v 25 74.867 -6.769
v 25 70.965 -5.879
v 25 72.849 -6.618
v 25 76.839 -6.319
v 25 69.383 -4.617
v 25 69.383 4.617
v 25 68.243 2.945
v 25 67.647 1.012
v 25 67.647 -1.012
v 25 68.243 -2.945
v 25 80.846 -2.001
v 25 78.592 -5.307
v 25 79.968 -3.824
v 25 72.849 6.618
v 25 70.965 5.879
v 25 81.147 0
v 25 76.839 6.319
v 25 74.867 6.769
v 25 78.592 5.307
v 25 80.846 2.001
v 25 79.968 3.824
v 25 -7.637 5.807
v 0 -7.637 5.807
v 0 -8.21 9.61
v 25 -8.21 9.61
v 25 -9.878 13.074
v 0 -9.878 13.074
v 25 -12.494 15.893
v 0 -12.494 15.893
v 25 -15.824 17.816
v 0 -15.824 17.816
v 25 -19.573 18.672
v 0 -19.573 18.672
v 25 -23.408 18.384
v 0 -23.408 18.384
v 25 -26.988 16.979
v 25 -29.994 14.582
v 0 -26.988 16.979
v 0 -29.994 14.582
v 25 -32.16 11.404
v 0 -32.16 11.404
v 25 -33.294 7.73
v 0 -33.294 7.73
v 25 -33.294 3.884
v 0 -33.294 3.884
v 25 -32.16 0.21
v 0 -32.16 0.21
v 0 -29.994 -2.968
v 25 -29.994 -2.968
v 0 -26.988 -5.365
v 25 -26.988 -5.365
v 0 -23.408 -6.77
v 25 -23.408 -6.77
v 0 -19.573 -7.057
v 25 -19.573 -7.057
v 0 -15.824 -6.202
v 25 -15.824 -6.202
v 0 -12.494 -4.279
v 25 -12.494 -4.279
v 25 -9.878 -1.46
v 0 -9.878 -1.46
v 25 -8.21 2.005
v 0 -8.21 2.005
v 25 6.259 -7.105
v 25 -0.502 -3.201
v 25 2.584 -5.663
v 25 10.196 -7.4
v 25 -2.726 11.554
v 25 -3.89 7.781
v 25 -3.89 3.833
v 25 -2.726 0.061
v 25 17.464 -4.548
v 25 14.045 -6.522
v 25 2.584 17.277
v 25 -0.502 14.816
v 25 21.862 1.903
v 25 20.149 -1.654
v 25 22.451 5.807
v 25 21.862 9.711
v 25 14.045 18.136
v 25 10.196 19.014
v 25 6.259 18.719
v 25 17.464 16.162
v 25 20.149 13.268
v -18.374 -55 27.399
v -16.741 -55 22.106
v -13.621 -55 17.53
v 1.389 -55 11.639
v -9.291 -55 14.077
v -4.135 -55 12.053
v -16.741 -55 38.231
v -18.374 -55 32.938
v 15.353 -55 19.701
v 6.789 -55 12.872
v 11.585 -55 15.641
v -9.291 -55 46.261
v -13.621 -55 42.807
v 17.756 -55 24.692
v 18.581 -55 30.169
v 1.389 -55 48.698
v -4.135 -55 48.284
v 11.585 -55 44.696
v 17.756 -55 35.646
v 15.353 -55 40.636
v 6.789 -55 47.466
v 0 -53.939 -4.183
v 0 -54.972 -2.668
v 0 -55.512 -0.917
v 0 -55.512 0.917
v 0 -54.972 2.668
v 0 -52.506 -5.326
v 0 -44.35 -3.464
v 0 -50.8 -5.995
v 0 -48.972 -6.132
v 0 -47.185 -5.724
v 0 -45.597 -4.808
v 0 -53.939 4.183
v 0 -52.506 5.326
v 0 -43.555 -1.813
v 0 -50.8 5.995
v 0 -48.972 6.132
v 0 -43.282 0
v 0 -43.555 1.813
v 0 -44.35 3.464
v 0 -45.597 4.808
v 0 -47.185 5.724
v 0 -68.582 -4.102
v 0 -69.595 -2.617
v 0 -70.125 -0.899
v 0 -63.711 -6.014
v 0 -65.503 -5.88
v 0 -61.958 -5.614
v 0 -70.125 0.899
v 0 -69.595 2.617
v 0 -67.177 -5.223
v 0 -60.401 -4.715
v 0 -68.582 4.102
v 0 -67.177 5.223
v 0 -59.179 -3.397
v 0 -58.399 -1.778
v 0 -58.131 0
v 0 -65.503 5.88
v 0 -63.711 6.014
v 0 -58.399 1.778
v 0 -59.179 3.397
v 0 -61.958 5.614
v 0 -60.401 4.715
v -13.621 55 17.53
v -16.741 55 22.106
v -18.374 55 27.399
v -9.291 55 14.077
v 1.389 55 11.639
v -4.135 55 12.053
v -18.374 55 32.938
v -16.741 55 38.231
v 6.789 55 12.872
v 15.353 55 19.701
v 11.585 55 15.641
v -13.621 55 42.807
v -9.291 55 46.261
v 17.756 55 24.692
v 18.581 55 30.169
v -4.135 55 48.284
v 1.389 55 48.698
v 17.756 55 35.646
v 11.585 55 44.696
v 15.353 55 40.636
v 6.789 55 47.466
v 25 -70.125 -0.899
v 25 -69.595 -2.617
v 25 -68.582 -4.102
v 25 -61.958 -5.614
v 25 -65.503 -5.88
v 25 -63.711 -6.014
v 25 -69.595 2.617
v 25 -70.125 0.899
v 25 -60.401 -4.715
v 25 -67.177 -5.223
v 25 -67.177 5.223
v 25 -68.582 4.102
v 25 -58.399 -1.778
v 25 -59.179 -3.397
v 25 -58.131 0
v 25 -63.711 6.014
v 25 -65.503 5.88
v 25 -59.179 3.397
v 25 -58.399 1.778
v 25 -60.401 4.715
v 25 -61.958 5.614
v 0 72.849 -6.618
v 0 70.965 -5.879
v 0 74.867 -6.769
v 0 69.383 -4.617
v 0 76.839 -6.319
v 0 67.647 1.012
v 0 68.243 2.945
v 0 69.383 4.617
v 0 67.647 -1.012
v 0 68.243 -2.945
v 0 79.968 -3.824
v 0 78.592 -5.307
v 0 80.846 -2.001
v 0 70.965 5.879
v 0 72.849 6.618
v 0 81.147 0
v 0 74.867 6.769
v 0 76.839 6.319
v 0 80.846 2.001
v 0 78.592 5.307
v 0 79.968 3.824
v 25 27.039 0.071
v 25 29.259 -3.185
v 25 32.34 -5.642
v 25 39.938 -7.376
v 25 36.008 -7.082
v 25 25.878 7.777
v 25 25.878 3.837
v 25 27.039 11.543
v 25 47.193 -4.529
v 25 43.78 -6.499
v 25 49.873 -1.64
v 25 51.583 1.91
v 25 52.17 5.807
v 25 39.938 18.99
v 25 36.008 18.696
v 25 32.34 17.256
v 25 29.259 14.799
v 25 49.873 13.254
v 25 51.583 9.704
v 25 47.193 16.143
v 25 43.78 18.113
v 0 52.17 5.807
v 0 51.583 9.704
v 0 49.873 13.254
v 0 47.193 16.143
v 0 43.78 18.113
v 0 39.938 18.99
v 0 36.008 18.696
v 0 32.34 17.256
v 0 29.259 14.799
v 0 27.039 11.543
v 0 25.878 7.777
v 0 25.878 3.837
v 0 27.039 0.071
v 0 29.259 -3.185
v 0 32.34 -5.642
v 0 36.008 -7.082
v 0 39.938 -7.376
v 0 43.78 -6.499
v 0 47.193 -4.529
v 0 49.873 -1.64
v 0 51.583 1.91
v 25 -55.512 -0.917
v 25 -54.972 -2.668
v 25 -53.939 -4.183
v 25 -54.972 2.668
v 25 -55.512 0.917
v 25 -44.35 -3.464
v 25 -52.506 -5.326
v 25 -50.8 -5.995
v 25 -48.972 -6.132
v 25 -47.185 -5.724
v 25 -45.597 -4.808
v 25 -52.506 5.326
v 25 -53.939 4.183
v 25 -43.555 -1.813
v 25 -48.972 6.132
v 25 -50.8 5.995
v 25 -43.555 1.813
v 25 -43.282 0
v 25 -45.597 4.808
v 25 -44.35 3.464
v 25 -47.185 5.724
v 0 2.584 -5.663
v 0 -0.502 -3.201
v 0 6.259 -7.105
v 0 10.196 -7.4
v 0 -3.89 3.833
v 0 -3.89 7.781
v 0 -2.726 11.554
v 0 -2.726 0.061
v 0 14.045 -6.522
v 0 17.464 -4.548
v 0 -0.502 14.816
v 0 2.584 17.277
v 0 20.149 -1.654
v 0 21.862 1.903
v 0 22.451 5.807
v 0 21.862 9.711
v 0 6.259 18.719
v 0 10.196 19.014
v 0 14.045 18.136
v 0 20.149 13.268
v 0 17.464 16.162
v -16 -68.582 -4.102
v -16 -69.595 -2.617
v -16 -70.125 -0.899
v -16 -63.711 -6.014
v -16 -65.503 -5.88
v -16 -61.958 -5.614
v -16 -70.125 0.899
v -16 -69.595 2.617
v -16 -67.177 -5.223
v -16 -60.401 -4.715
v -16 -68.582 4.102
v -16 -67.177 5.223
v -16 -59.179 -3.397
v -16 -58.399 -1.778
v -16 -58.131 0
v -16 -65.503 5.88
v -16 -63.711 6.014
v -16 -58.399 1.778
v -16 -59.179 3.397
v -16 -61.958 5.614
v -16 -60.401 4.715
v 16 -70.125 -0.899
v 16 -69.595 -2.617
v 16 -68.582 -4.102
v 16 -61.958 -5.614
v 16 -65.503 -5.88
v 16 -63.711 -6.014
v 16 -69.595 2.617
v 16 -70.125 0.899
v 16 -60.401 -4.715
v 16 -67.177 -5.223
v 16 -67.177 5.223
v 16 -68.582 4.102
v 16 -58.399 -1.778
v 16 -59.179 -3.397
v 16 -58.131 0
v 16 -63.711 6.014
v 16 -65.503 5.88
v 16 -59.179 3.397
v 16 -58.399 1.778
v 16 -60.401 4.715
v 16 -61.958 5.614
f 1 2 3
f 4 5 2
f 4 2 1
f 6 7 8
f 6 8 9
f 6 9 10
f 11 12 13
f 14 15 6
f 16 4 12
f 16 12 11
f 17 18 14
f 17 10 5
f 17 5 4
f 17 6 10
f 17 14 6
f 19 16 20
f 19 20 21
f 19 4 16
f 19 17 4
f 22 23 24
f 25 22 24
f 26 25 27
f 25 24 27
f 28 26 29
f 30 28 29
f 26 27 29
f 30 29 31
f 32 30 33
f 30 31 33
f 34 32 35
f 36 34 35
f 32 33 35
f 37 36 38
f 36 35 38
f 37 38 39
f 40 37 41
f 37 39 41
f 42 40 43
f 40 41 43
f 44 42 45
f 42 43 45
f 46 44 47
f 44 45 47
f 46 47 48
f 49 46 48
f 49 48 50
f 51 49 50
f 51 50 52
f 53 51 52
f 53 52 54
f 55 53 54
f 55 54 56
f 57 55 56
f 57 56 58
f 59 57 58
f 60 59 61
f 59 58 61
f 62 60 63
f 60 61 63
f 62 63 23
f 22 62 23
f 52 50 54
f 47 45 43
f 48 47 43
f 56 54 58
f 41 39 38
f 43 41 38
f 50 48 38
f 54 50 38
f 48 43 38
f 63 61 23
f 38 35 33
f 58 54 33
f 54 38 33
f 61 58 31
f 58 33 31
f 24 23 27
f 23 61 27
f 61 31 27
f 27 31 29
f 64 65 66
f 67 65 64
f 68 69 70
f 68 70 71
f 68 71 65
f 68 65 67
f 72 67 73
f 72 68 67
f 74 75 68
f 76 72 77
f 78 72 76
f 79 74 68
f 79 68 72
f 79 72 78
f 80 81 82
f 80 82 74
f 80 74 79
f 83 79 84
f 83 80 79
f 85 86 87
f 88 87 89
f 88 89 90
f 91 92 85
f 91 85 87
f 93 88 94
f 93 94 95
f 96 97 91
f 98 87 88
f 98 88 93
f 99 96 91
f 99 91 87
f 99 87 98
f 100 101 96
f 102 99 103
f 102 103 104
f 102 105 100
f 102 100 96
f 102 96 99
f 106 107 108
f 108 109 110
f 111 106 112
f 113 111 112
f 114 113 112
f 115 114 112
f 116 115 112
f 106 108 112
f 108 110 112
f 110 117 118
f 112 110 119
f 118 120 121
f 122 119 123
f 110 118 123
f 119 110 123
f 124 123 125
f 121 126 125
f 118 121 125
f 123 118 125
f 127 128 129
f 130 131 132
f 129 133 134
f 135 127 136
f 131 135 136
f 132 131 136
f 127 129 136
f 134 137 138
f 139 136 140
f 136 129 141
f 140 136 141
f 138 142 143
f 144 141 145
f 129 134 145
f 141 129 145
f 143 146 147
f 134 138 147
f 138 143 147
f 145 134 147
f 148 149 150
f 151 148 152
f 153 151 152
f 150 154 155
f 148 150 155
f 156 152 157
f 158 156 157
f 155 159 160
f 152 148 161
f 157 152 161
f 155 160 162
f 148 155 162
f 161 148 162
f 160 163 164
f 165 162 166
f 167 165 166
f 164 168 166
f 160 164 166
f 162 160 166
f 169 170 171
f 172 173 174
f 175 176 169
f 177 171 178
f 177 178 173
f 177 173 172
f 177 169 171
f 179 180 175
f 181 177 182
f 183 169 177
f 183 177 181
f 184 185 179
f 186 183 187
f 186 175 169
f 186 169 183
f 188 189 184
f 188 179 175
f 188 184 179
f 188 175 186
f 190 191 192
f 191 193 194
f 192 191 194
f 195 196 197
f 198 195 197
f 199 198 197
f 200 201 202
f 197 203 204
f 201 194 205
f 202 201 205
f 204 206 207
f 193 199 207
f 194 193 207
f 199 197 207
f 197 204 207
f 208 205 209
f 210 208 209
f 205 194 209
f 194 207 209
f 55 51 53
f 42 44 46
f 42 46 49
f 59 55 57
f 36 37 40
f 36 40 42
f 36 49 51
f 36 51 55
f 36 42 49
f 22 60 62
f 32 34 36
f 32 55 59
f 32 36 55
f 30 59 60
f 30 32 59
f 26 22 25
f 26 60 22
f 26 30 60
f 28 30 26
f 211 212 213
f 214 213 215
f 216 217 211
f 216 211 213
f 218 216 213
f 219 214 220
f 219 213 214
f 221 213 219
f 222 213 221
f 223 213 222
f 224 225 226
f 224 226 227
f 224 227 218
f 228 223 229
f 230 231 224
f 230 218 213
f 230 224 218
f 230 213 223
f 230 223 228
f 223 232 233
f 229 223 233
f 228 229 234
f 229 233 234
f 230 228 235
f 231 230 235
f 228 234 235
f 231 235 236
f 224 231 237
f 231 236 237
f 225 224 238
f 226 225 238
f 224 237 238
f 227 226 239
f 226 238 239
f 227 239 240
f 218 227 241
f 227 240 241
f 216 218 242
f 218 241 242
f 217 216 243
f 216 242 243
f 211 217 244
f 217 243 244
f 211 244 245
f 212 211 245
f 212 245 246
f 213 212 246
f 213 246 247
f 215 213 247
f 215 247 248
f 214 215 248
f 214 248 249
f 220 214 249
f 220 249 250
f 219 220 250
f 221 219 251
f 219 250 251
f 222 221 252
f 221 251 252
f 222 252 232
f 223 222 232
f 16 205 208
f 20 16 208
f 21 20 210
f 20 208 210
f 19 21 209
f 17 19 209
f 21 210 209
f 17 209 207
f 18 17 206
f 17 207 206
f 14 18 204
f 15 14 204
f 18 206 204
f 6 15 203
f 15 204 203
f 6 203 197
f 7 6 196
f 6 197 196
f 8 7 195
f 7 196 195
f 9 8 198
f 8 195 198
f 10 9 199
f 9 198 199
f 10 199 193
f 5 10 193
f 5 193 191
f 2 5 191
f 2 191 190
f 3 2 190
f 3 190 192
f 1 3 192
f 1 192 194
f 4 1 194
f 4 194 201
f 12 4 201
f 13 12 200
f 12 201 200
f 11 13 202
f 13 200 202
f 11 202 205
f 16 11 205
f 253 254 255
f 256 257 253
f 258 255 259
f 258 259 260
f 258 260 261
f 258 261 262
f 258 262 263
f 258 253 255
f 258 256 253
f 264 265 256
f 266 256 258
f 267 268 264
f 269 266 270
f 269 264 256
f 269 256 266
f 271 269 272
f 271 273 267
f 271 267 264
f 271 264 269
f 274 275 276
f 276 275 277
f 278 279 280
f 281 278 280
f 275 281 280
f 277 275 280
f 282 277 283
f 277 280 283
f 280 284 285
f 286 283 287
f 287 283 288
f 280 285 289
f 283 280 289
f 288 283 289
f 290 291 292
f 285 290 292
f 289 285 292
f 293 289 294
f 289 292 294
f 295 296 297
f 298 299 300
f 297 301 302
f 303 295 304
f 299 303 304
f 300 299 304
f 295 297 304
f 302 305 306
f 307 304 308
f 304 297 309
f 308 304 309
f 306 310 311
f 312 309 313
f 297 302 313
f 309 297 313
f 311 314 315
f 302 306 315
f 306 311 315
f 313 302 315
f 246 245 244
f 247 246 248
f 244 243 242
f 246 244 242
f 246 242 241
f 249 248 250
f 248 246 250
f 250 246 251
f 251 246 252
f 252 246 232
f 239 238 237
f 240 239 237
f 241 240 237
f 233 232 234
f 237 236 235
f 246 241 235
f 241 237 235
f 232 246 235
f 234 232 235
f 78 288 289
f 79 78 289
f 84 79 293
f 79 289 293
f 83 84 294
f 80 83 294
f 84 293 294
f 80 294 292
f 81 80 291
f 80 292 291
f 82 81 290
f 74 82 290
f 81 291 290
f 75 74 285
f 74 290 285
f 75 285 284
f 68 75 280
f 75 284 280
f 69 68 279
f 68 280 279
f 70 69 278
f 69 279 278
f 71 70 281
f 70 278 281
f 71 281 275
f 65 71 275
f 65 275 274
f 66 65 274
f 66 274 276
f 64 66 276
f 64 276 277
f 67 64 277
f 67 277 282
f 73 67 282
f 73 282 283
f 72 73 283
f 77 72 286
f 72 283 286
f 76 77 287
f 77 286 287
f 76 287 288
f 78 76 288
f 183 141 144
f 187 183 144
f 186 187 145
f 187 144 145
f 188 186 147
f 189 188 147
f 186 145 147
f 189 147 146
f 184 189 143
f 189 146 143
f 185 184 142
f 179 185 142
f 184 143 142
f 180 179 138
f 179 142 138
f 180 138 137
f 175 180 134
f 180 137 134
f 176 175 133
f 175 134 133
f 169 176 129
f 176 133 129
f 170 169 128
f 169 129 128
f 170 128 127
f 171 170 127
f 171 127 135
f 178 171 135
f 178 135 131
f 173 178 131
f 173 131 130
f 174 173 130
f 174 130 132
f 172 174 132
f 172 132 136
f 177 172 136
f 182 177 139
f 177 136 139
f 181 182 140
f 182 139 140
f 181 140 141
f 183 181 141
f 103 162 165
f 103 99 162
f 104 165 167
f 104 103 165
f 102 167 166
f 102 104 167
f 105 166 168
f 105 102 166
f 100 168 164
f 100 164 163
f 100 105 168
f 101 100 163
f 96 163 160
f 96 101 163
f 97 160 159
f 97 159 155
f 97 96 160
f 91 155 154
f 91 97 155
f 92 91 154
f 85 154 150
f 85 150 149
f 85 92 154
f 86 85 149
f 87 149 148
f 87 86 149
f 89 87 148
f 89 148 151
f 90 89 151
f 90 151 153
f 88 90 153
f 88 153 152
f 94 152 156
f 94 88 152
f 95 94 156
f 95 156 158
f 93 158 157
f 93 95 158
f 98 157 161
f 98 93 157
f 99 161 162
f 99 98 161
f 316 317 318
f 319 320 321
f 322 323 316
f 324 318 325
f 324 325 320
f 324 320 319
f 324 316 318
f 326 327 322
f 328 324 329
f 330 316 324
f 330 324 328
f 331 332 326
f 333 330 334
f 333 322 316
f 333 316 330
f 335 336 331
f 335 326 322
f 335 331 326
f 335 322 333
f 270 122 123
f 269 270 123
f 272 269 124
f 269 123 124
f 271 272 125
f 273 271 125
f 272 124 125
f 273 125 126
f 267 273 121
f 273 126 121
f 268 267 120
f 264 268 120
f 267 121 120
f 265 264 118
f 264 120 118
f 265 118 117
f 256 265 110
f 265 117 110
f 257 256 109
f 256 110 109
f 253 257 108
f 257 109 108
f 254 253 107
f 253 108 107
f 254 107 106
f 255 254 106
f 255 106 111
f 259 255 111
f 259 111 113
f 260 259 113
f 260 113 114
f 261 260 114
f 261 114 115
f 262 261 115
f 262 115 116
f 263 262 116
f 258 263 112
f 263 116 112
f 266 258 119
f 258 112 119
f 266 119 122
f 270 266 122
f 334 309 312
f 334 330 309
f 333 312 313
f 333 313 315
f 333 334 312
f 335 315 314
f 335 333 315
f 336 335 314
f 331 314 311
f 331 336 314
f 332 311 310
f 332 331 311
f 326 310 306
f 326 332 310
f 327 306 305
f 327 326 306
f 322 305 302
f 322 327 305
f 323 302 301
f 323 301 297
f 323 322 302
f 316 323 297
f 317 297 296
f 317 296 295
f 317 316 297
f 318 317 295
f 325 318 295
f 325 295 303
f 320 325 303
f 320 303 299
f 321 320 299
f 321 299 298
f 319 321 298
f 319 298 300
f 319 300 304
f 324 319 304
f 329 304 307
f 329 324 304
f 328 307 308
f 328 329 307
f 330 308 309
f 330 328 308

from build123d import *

# Parameters (mm, degrees)
F1_R          = 18.581408
F2_DEPTH      = 55
F2_DEPTH_BACK = 55
F0_R          = 6.0308
F3_DEPTH      = 16
F3_DEPTH_BACK = 16
F0_R_2        = 6.149382
F0_R_3        = 12.900607
F0_R_4        = 13.244357
F0_R_5        = 13.220098
F0_R_6        = 6.788227
F4_DEPTH      = 25


with BuildPart() as f2:
    # F1 (on Front) → F2 (new body, two sides)
    with BuildSketch(Plane.XZ) as f2_sk:
        with Locations((0, 30.168617)):
            Circle(F1_R)
    extrude(amount=F2_DEPTH)
    extrude(f2_sk.sketch, amount=-F2_DEPTH_BACK)


with BuildPart() as f3:
    # F0 (on Right) → F3 (new body, two sides)
    with BuildSketch(Plane.YZ) as f3_sk:
        with Locations((-64.161427, 0)):
            Circle(F0_R)
    extrude(amount=F3_DEPTH)
    extrude(f3_sk.sketch, amount=-F3_DEPTH_BACK)


with BuildPart() as f4:
    # F0 (on Right) → F4 (new body)
    with BuildSketch(Plane.YZ):
        with Locations((-64.161427, 0)):
            Circle(F0_R)
        with Locations((-49.431205, 0)):
            Circle(F0_R_2)
        with Locations((-20.537321, 5.807104)):
            Circle(F0_R_3)
        with Locations((9.206384, 5.807104)):
            Circle(F0_R_4)
        with Locations((38.950093, 5.807104)):
            Circle(F0_R_5)
        with Locations((74.35926, 0)):
            Circle(F0_R_6)
    extrude(amount=F4_DEPTH)


solid = Compound([f2.part, f3.part, f4.part])
